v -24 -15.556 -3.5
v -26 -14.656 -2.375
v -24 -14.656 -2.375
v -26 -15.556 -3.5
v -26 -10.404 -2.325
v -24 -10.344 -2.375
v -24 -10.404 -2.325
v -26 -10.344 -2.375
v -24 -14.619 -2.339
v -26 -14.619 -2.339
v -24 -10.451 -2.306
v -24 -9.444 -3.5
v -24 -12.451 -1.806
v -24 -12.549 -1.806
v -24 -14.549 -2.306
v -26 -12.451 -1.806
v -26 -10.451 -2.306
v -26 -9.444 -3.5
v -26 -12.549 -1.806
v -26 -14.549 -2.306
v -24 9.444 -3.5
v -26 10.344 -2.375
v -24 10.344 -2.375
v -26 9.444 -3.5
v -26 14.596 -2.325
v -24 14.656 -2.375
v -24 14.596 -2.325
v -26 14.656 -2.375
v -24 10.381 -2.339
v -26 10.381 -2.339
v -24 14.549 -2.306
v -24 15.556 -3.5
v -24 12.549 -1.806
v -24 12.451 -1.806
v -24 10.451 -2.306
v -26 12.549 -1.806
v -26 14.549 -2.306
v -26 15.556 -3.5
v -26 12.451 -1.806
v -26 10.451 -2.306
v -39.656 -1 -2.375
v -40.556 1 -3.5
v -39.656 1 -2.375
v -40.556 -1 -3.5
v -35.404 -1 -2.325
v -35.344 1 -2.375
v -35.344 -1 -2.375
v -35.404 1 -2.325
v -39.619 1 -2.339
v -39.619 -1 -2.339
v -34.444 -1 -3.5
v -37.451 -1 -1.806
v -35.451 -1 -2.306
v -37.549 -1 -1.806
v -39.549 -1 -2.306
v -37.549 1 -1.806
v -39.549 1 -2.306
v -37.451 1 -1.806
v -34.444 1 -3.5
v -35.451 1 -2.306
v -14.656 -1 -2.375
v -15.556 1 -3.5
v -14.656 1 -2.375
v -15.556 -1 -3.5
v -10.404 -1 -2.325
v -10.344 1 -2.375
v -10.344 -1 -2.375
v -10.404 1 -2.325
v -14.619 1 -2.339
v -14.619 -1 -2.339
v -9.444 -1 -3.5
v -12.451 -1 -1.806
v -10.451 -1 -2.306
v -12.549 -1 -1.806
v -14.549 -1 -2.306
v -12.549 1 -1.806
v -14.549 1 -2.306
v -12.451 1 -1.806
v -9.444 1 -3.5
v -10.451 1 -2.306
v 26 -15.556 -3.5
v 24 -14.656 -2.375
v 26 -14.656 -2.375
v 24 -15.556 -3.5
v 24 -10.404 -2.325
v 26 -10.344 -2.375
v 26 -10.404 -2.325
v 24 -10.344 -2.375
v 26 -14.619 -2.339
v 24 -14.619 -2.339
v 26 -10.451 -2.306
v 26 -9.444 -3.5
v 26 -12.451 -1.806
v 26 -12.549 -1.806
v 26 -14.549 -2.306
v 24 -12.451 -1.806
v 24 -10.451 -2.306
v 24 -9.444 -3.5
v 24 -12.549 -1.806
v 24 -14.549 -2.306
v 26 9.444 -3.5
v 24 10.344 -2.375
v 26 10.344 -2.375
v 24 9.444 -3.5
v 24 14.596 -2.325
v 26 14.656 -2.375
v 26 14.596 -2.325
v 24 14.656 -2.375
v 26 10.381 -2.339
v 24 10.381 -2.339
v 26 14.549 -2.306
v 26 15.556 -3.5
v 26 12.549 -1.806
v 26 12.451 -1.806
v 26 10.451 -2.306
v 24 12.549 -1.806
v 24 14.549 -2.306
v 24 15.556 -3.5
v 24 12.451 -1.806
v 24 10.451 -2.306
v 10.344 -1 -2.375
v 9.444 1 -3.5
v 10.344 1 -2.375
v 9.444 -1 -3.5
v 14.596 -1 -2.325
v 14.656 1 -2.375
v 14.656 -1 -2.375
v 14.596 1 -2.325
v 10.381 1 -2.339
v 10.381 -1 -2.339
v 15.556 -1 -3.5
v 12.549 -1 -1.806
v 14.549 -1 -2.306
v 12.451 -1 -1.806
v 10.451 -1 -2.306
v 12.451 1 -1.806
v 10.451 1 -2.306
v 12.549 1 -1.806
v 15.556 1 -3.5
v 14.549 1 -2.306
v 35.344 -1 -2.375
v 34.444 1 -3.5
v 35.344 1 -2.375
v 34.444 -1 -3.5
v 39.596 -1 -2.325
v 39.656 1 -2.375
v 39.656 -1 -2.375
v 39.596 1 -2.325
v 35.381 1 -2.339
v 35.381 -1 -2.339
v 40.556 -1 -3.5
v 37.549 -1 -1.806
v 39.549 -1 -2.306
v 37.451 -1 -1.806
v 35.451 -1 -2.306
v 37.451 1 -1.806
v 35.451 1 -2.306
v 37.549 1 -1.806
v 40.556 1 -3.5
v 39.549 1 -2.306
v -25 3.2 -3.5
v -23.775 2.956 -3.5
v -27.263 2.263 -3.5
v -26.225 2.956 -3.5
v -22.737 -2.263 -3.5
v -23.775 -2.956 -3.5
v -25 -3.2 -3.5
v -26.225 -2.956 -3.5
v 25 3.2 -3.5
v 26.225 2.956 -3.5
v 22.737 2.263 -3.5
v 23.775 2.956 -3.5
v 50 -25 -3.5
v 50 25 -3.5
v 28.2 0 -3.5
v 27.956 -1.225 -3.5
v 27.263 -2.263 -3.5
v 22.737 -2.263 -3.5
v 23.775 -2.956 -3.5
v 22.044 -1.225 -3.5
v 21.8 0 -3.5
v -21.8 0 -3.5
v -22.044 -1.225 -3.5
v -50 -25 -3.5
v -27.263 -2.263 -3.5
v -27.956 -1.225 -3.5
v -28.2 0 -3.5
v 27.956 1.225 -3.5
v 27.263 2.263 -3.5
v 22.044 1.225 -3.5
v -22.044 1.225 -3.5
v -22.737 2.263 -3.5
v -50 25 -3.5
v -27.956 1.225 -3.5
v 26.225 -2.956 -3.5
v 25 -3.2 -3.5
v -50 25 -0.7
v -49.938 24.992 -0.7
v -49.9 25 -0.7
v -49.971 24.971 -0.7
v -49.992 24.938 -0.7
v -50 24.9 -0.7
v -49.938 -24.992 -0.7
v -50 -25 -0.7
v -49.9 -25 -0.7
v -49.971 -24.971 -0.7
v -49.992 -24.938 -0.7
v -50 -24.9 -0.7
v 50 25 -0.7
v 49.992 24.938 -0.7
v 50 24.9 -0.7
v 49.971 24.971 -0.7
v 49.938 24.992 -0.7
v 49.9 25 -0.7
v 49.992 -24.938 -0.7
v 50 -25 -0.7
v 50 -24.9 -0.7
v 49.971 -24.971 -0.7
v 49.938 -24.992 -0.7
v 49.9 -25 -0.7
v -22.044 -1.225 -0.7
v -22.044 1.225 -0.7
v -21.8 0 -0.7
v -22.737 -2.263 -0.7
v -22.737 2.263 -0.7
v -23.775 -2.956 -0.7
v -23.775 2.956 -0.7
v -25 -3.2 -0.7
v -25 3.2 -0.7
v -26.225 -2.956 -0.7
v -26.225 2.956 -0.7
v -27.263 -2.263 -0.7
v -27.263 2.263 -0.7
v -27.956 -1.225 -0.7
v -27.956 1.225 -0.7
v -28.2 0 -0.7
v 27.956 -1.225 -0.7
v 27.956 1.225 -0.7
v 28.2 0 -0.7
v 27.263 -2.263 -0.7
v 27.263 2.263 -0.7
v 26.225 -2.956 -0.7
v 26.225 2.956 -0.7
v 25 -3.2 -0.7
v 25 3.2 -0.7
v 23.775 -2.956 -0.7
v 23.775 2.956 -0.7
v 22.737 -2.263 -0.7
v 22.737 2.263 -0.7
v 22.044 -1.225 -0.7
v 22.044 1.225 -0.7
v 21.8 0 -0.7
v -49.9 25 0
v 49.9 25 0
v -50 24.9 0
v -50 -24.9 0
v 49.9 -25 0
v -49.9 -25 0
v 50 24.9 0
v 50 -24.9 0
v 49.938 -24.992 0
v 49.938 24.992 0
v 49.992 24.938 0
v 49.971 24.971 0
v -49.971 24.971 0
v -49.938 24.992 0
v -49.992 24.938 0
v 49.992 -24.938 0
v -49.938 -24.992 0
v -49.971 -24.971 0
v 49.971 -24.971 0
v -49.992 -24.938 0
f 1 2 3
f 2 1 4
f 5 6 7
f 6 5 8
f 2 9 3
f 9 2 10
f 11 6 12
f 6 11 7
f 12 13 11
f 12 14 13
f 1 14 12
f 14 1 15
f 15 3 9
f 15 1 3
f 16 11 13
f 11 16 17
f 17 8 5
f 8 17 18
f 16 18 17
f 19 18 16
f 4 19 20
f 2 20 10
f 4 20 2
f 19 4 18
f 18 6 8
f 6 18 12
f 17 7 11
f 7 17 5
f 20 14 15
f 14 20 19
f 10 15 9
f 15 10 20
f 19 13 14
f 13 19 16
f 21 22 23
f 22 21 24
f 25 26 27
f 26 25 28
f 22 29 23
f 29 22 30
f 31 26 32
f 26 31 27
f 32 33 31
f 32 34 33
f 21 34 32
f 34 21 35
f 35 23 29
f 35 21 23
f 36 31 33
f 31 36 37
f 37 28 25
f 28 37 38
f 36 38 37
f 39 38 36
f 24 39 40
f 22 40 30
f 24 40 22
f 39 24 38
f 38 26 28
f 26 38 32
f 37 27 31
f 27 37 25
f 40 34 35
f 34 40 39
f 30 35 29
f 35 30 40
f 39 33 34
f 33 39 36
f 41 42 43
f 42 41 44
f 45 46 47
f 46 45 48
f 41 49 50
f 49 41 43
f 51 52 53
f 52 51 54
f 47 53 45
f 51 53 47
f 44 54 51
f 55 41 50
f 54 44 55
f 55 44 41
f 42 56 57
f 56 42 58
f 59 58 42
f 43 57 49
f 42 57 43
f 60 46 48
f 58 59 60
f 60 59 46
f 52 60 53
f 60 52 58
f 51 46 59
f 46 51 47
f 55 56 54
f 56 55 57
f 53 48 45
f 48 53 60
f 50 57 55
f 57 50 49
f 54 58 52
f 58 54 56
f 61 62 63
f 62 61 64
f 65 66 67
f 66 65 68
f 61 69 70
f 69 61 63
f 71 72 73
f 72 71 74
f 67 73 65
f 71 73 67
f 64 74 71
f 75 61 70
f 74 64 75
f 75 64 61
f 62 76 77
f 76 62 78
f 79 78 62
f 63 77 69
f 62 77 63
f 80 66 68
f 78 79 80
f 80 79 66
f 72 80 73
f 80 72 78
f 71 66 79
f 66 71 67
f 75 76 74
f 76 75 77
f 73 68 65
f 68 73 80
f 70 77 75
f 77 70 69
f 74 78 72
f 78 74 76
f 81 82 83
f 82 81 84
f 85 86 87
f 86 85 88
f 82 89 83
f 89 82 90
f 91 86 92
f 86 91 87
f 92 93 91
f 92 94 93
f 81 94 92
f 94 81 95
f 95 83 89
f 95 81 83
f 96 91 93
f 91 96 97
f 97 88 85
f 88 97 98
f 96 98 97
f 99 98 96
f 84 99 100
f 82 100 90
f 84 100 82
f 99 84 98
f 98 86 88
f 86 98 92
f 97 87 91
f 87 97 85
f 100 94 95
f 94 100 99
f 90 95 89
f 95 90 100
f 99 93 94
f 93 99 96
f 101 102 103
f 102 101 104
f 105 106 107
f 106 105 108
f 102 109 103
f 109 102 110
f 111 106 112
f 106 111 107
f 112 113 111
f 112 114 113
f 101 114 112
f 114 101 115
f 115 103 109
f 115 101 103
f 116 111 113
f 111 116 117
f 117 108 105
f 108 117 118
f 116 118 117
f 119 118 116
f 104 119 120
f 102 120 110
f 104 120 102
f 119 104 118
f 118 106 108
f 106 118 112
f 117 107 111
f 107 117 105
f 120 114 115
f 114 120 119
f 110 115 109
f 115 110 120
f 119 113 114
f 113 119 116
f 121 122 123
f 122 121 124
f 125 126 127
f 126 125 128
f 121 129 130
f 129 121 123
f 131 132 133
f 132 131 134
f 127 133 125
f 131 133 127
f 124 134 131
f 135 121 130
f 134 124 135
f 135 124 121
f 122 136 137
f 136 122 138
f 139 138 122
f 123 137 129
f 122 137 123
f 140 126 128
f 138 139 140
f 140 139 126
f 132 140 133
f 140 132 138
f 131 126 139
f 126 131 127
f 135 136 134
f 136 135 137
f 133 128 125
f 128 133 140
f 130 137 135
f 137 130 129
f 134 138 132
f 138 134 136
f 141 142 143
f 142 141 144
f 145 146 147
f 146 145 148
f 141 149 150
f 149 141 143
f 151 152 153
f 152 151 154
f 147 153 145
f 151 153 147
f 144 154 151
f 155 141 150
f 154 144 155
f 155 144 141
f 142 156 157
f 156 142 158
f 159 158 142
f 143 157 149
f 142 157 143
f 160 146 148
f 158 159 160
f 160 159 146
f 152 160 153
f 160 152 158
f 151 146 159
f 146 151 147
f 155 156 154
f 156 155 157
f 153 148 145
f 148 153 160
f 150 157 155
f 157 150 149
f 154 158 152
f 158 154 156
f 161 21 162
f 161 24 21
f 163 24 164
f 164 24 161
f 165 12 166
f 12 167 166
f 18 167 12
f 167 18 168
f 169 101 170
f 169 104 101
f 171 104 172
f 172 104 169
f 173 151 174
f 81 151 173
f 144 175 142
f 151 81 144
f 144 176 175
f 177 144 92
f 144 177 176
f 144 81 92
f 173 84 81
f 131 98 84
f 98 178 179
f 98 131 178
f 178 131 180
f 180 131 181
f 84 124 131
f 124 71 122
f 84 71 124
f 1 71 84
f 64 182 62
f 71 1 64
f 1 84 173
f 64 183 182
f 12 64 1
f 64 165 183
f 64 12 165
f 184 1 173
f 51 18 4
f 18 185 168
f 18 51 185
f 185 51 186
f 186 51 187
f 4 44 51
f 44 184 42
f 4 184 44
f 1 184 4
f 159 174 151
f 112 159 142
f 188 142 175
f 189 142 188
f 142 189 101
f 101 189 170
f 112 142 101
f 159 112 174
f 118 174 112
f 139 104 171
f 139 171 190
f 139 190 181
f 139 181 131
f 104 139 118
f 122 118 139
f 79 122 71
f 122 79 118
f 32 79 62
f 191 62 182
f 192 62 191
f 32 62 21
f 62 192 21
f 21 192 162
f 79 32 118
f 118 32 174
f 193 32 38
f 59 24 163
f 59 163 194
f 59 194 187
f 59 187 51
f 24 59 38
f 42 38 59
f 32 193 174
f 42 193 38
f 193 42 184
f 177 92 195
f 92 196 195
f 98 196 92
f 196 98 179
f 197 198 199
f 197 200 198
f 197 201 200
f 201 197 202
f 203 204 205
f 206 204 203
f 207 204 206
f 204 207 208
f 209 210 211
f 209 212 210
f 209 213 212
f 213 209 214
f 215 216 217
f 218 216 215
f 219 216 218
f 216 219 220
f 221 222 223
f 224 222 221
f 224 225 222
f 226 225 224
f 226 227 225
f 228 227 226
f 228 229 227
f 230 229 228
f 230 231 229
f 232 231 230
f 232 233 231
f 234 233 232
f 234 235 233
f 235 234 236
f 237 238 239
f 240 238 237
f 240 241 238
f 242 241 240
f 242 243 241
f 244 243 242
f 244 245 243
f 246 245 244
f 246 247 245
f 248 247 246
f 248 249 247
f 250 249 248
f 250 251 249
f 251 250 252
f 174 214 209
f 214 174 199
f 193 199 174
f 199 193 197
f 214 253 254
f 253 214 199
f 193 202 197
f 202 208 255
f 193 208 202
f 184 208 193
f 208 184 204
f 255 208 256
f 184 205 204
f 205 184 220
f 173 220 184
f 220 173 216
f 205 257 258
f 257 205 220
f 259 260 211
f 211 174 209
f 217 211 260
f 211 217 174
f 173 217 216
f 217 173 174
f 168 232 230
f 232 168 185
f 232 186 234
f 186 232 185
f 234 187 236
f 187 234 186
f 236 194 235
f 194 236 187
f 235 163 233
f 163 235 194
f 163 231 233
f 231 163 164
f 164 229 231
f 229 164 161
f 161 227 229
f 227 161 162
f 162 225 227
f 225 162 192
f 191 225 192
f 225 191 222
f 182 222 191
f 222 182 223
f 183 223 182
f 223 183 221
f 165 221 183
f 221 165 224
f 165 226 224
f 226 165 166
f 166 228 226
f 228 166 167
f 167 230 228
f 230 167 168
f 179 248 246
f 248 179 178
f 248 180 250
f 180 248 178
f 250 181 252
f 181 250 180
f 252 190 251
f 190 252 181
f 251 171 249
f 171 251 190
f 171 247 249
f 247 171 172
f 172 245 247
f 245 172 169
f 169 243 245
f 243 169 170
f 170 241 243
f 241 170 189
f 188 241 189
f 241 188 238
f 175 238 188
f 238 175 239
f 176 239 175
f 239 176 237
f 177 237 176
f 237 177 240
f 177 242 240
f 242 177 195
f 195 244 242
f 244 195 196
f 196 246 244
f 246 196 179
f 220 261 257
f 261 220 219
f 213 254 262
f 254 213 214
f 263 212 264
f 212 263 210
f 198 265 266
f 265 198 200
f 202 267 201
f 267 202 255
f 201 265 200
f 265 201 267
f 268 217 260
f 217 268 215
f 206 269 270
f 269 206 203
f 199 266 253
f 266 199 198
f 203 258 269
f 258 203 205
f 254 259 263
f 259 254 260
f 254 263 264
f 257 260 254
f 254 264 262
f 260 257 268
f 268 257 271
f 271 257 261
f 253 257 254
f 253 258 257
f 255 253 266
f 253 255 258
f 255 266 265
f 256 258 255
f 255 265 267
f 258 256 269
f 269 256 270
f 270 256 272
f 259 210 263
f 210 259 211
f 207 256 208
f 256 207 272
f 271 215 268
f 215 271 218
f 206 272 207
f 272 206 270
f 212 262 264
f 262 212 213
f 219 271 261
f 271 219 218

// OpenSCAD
// file: girl_lock.scad
// Copyright 2025 Natalie Baker // Apache v2 //

include<girl_common.scad>;

girl_lock();

//color("blue")
//translate([0,0,-1]) 
//girl_slot();

module girl_lock(center=true) {
	$fn=12;
	linear_extrude(lock_height, center=center, convexity=2)
	mirror_copy([0,1])
	mirror_copy([1,0])
	_girl_lock_part();
}

module girl_slot(center=true) {
	$fn=12;
	linear_extrude(lock_height+0.4, center=center, convexity=2)
	mirror_copy([0,1])
	mirror_copy([1,0])
	_girl_slot_part();
}

module _girl_slot_part() {
	polygon([
		[           0,      0.00],
		[lock_width/2+0.30, 0.00],
		[lock_width/2+0.30, lock_shoulder+0.2],
		[lock_width/2-0.45, lock_shoulder+0.2],
		[lock_width/2-0.75, 2.80],
		[lock_width/2-0.55, lock_depth],
		[lock_width/2+0.50, lock_depth],
		[lock_width/2+0.50, 8.25],
		[lock_width/2-5.00, 8.25],
		[lock_width/2-4.70, 2.75],
		[lock_width/2-5.00, 2.30],
		[           0,      2.30],
	]);
}

module _girl_lock_part() {
	difference() {
		polygon([
			[           0,      0.00],
			[lock_width/2,      0.00],
			[lock_width/2,      lock_shoulder],
			[lock_width/2-0.95, lock_shoulder],
			[lock_width/2-0.60, lock_depth+0.1],
			[lock_width/2,      lock_depth+0.1],
			[lock_width/2-0.30, 6.20],
			[lock_width/2-2.15, 7.65],
			[lock_width/2-2.60, 7.90],
			[lock_width/2-3.00, 8.00],
			[lock_width/2-3.40, 7.90],
			[lock_width/2-3.60, 7.70],
			[lock_width/2-3.70, 7.45],
			[lock_width/2-3.25, 2.00],
			[           0,      2.00],
		]);
		polygon([
			[lock_width/2-2.10, 1.00],
			[lock_width/2-1.60, 5.50],
			[lock_width/2-2.50, 6.50],
			[lock_width/2-2.20, 1.00],
		]);
	}
}

module mirror_copy(m) {
	mirror(m) children();
	children();	
}
// file: girl_grid.scad
// Copyright 2025 Natalie Baker // Apache v2 //

include<girl_common.scad>;
use<girl_lock.scad>;

grid_grid_map([[1]]);

module grid_grid_map(m) {

	for(y = [0:len(m)-1]) {
		for(x = [0:len(m[y])-1]) {
			translate([x*grid_size, y*grid_size])
			if (m[y][x]) {
				
				tile_px = m[y][x+1] == 1;
				tile_nx = m[y][x-1] == 1;
				tile_py = m[y+1][x] == 1;
				tile_ny = m[y-1][x] == 1;
				
				air_px = m[y][x+1] != 1;
				air_nx = m[y][x-1] != 1;
				air_py = m[y+1][x] != 1;
				air_ny = m[y-1][x] != 1;
				
				air_pxpy = m[y+1][x+1] != 1;
				air_pxny = m[y-1][x+1] != 1;
				air_nxpy = m[y+1][x-1] != 1;
				air_nxny = m[y-1][x-1] != 1;
				
				girl_grid_section(air_px, air_py, air_nx, air_ny);
				
				linear_extrude(grid_height)
				union() {
					if (tile_px && air_pxpy) {
						translate([grid_size/2, (grid_size-lock_depth)/2])
						square([lock_depth*2, lock_depth], center=true);
					}
						
					if (tile_px && air_pxny) {
						translate([grid_size/2, -(grid_size-lock_depth)/2])
						square([lock_depth*2, lock_depth], center=true);
					}
					
					// -- //
				
					if (tile_nx && air_nxpy) {
						translate([-grid_size/2, (grid_size-lock_depth)/2])
						square([lock_depth*2, lock_depth], center=true);
						
					}
						
					if (tile_nx && air_nxny) {
						translate([-grid_size/2, -(grid_size-lock_depth)/2])
						square([lock_depth*2, lock_depth], center=true);
					}
					
					// -- //
				
					if (tile_py && air_pxpy) {
						translate([(grid_size-lock_depth)/2, grid_size/2])
						square([lock_depth, lock_depth*2], center=true);
					}
				
					if (tile_py && air_nxpy) {
						translate([-(grid_size-lock_depth)/2, grid_size/2])
						square([lock_depth, lock_depth*2], center=true);
					}
					
					// -- //
					
					if (tile_ny && air_pxny) {
						translate([(grid_size-lock_depth)/2, -grid_size/2])
						square([lock_depth, lock_depth*2], center=true);
					}
						
					if (tile_ny && air_nxny) {
						translate([-(grid_size-lock_depth)/2, -grid_size/2])
						square([lock_depth, lock_depth*2], center=true);
					}
				}
			}
		}
	}
	
}

module girl_grid_section(x_p, y_p, x_n, y_n) {
	$fn=24;
	intersection() {
		union() {
			_girl_grid_single();
			
			if (x_p)
			rotate(270)
			translate([0,grid_size/2])
			_girl_grid_slots();
			
			if (x_n)
			rotate(90)
			translate([0,grid_size/2])
			_girl_grid_slots();
			
			if (y_p)
			translate([0,grid_size/2,0])
			_girl_grid_slots();
			
			if (y_n)
			rotate(180)
			translate([0,grid_size/2,0])
			_girl_grid_slots();
		}
			
		linear_extrude(grid_height+100, convexity=2)
		offset( lock_depth/2)
		offset(-lock_depth/2)
		square([grid_size,grid_size],center=true);
	}
}


module _girl_grid_slots() {

	difference() {
		translate([-grid_size/2,-lock_depth,0])
			cube([grid_size,lock_depth,grid_height]);

		translate([-grid_size/4,0,grid_height/2])
			girl_slot();

		translate([grid_size/4,0,grid_height/2])
			girl_slot();
	}
		
}

module _girl_grid_single() {
	union() {
		render()
		difference() {
			linear_extrude(grid_height)
			intersection() {
				repeat([grid_diag/2,grid_diag/2,1], 2, 2, 1, true)
					_girl_grid_lattice(grid_diag/2, frame_size, 6.0);
				square(grid_size, center=true);
			}
			
			_girl_grid_magnet_hole();
			_girl_grid_key(frame_size/3*2,  0.2);
		}
		
		translate([0,0,grid_height])
		_girl_grid_key(frame_size/3*2);
	}
}

module _girl_grid_magnet_hole(tolerance=0.15) {
	mad_d = magnet_dia+2*tolerance;
	mag_h = magnet_height+2*tolerance;
	
	translate([0,0,-tolerance])
	cylinder(d=4, h=grid_height-magnet_height+2*tolerance);
	
	translate([0,0,grid_height-magnet_height])
	cylinder(d=mad_d, h=mag_h);
}

module _girl_grid_lattice(size, wall, radius) {
	intersection() {
		offset(-radius)
		offset( radius)
		union() {
			difference() {
				square(size*26, center=true);
				square(size-wall, center=true);
			}
		}
		square(size, center=true);
	}
}

module _girl_grid_key(wall, tolerance=0) {
	translate([0,-grid_size/4,0])
	rotate([0,0,90])
	_girl_grid_key_single(wall, tolerance);

	translate([0,grid_size/4,0])
	rotate([0,0,90])
	_girl_grid_key_single(wall, tolerance);

	translate([-grid_size/4,0,0])
	_girl_grid_key_single(wall, tolerance);

	translate([grid_size/4,0,0])
	_girl_grid_key_single(wall, tolerance);
}

module _girl_grid_key_single(wall, tolerance=0) {
	rotate([90,0,0])
	translate([0,0,-wall/2-tolerance])
	linear_extrude(wall+2*tolerance)
	offset(tolerance)
	polygon([
		[ 0.00,-0.25],
		[ 3.00,-0.25],
		[ 2.00, 1.00],
		[ 0.00, 1.50],
		[-2.00, 1.00],
		[-3.00,-0.25]
	]);
}
// file: girl_common.scad
// Copyright 2025 Natalie Baker // Apache v2 //

base_size  = 32;
wall_width =  9;

magnet_dia    = 6.2;
magnet_height = 2.8;

lock_height   = 1.9;
lock_depth    = 4.9;
lock_shoulder = 2.0;
lock_width    = 11;

grid_size   = base_size + 2*wall_width;
grid_diag   = sqrt(2*grid_size*grid_size);
grid_height = max(lock_height, magnet_height)+1.2;

frame_size = 2.4;

module mirror_copy(m) {
	mirror(m) children();
	children();	
}

module repeat(size, x, y, z, center) {
	off = center 
		? [(x-1)*size[0],(y-1)*size[1],(z-1)*size[2]]/2 
		: [0,0,0];

	for(i = [0 : x-1])
	for(j = [0 : y-1])
	for(k = [0 : z-1])
		translate([
			size[0]*i-off[0],
			size[1]*j-off[1],
			size[2]*k-off[2]
		]) children();
}
// main file
// Copyright 2025 Natalie Baker // Apache v2 //

include<girl_common.scad>;
use<girl_grid.scad>;

girl_tile(2);

module girl_tile(x = 1, y= 1) {
	$fn=16;
	translate([0,0,-(magnet_height+0.7)]) {
		
		translate([0,0,magnet_height])
		linear_extrude(0.7) 
		offset( 0.1)
		offset(-0.1)
		square([grid_size*x,grid_size*y], center=true);
	  
		difference() {
			linear_extrude(magnet_height) 
			difference() {
				square([grid_size*x,grid_size*y], center=true);

				repeat([grid_size, grid_size, 1], x, y, 1, true) {
					circle(d=magnet_dia+0.2);
				}
			}
			
			repeat([grid_size, grid_size, 1], x, y, 1, true) {
				_girl_grid_key(frame_size/3*2, 0.2);
			}
		}
	}
}


//_girl_grid_key();
